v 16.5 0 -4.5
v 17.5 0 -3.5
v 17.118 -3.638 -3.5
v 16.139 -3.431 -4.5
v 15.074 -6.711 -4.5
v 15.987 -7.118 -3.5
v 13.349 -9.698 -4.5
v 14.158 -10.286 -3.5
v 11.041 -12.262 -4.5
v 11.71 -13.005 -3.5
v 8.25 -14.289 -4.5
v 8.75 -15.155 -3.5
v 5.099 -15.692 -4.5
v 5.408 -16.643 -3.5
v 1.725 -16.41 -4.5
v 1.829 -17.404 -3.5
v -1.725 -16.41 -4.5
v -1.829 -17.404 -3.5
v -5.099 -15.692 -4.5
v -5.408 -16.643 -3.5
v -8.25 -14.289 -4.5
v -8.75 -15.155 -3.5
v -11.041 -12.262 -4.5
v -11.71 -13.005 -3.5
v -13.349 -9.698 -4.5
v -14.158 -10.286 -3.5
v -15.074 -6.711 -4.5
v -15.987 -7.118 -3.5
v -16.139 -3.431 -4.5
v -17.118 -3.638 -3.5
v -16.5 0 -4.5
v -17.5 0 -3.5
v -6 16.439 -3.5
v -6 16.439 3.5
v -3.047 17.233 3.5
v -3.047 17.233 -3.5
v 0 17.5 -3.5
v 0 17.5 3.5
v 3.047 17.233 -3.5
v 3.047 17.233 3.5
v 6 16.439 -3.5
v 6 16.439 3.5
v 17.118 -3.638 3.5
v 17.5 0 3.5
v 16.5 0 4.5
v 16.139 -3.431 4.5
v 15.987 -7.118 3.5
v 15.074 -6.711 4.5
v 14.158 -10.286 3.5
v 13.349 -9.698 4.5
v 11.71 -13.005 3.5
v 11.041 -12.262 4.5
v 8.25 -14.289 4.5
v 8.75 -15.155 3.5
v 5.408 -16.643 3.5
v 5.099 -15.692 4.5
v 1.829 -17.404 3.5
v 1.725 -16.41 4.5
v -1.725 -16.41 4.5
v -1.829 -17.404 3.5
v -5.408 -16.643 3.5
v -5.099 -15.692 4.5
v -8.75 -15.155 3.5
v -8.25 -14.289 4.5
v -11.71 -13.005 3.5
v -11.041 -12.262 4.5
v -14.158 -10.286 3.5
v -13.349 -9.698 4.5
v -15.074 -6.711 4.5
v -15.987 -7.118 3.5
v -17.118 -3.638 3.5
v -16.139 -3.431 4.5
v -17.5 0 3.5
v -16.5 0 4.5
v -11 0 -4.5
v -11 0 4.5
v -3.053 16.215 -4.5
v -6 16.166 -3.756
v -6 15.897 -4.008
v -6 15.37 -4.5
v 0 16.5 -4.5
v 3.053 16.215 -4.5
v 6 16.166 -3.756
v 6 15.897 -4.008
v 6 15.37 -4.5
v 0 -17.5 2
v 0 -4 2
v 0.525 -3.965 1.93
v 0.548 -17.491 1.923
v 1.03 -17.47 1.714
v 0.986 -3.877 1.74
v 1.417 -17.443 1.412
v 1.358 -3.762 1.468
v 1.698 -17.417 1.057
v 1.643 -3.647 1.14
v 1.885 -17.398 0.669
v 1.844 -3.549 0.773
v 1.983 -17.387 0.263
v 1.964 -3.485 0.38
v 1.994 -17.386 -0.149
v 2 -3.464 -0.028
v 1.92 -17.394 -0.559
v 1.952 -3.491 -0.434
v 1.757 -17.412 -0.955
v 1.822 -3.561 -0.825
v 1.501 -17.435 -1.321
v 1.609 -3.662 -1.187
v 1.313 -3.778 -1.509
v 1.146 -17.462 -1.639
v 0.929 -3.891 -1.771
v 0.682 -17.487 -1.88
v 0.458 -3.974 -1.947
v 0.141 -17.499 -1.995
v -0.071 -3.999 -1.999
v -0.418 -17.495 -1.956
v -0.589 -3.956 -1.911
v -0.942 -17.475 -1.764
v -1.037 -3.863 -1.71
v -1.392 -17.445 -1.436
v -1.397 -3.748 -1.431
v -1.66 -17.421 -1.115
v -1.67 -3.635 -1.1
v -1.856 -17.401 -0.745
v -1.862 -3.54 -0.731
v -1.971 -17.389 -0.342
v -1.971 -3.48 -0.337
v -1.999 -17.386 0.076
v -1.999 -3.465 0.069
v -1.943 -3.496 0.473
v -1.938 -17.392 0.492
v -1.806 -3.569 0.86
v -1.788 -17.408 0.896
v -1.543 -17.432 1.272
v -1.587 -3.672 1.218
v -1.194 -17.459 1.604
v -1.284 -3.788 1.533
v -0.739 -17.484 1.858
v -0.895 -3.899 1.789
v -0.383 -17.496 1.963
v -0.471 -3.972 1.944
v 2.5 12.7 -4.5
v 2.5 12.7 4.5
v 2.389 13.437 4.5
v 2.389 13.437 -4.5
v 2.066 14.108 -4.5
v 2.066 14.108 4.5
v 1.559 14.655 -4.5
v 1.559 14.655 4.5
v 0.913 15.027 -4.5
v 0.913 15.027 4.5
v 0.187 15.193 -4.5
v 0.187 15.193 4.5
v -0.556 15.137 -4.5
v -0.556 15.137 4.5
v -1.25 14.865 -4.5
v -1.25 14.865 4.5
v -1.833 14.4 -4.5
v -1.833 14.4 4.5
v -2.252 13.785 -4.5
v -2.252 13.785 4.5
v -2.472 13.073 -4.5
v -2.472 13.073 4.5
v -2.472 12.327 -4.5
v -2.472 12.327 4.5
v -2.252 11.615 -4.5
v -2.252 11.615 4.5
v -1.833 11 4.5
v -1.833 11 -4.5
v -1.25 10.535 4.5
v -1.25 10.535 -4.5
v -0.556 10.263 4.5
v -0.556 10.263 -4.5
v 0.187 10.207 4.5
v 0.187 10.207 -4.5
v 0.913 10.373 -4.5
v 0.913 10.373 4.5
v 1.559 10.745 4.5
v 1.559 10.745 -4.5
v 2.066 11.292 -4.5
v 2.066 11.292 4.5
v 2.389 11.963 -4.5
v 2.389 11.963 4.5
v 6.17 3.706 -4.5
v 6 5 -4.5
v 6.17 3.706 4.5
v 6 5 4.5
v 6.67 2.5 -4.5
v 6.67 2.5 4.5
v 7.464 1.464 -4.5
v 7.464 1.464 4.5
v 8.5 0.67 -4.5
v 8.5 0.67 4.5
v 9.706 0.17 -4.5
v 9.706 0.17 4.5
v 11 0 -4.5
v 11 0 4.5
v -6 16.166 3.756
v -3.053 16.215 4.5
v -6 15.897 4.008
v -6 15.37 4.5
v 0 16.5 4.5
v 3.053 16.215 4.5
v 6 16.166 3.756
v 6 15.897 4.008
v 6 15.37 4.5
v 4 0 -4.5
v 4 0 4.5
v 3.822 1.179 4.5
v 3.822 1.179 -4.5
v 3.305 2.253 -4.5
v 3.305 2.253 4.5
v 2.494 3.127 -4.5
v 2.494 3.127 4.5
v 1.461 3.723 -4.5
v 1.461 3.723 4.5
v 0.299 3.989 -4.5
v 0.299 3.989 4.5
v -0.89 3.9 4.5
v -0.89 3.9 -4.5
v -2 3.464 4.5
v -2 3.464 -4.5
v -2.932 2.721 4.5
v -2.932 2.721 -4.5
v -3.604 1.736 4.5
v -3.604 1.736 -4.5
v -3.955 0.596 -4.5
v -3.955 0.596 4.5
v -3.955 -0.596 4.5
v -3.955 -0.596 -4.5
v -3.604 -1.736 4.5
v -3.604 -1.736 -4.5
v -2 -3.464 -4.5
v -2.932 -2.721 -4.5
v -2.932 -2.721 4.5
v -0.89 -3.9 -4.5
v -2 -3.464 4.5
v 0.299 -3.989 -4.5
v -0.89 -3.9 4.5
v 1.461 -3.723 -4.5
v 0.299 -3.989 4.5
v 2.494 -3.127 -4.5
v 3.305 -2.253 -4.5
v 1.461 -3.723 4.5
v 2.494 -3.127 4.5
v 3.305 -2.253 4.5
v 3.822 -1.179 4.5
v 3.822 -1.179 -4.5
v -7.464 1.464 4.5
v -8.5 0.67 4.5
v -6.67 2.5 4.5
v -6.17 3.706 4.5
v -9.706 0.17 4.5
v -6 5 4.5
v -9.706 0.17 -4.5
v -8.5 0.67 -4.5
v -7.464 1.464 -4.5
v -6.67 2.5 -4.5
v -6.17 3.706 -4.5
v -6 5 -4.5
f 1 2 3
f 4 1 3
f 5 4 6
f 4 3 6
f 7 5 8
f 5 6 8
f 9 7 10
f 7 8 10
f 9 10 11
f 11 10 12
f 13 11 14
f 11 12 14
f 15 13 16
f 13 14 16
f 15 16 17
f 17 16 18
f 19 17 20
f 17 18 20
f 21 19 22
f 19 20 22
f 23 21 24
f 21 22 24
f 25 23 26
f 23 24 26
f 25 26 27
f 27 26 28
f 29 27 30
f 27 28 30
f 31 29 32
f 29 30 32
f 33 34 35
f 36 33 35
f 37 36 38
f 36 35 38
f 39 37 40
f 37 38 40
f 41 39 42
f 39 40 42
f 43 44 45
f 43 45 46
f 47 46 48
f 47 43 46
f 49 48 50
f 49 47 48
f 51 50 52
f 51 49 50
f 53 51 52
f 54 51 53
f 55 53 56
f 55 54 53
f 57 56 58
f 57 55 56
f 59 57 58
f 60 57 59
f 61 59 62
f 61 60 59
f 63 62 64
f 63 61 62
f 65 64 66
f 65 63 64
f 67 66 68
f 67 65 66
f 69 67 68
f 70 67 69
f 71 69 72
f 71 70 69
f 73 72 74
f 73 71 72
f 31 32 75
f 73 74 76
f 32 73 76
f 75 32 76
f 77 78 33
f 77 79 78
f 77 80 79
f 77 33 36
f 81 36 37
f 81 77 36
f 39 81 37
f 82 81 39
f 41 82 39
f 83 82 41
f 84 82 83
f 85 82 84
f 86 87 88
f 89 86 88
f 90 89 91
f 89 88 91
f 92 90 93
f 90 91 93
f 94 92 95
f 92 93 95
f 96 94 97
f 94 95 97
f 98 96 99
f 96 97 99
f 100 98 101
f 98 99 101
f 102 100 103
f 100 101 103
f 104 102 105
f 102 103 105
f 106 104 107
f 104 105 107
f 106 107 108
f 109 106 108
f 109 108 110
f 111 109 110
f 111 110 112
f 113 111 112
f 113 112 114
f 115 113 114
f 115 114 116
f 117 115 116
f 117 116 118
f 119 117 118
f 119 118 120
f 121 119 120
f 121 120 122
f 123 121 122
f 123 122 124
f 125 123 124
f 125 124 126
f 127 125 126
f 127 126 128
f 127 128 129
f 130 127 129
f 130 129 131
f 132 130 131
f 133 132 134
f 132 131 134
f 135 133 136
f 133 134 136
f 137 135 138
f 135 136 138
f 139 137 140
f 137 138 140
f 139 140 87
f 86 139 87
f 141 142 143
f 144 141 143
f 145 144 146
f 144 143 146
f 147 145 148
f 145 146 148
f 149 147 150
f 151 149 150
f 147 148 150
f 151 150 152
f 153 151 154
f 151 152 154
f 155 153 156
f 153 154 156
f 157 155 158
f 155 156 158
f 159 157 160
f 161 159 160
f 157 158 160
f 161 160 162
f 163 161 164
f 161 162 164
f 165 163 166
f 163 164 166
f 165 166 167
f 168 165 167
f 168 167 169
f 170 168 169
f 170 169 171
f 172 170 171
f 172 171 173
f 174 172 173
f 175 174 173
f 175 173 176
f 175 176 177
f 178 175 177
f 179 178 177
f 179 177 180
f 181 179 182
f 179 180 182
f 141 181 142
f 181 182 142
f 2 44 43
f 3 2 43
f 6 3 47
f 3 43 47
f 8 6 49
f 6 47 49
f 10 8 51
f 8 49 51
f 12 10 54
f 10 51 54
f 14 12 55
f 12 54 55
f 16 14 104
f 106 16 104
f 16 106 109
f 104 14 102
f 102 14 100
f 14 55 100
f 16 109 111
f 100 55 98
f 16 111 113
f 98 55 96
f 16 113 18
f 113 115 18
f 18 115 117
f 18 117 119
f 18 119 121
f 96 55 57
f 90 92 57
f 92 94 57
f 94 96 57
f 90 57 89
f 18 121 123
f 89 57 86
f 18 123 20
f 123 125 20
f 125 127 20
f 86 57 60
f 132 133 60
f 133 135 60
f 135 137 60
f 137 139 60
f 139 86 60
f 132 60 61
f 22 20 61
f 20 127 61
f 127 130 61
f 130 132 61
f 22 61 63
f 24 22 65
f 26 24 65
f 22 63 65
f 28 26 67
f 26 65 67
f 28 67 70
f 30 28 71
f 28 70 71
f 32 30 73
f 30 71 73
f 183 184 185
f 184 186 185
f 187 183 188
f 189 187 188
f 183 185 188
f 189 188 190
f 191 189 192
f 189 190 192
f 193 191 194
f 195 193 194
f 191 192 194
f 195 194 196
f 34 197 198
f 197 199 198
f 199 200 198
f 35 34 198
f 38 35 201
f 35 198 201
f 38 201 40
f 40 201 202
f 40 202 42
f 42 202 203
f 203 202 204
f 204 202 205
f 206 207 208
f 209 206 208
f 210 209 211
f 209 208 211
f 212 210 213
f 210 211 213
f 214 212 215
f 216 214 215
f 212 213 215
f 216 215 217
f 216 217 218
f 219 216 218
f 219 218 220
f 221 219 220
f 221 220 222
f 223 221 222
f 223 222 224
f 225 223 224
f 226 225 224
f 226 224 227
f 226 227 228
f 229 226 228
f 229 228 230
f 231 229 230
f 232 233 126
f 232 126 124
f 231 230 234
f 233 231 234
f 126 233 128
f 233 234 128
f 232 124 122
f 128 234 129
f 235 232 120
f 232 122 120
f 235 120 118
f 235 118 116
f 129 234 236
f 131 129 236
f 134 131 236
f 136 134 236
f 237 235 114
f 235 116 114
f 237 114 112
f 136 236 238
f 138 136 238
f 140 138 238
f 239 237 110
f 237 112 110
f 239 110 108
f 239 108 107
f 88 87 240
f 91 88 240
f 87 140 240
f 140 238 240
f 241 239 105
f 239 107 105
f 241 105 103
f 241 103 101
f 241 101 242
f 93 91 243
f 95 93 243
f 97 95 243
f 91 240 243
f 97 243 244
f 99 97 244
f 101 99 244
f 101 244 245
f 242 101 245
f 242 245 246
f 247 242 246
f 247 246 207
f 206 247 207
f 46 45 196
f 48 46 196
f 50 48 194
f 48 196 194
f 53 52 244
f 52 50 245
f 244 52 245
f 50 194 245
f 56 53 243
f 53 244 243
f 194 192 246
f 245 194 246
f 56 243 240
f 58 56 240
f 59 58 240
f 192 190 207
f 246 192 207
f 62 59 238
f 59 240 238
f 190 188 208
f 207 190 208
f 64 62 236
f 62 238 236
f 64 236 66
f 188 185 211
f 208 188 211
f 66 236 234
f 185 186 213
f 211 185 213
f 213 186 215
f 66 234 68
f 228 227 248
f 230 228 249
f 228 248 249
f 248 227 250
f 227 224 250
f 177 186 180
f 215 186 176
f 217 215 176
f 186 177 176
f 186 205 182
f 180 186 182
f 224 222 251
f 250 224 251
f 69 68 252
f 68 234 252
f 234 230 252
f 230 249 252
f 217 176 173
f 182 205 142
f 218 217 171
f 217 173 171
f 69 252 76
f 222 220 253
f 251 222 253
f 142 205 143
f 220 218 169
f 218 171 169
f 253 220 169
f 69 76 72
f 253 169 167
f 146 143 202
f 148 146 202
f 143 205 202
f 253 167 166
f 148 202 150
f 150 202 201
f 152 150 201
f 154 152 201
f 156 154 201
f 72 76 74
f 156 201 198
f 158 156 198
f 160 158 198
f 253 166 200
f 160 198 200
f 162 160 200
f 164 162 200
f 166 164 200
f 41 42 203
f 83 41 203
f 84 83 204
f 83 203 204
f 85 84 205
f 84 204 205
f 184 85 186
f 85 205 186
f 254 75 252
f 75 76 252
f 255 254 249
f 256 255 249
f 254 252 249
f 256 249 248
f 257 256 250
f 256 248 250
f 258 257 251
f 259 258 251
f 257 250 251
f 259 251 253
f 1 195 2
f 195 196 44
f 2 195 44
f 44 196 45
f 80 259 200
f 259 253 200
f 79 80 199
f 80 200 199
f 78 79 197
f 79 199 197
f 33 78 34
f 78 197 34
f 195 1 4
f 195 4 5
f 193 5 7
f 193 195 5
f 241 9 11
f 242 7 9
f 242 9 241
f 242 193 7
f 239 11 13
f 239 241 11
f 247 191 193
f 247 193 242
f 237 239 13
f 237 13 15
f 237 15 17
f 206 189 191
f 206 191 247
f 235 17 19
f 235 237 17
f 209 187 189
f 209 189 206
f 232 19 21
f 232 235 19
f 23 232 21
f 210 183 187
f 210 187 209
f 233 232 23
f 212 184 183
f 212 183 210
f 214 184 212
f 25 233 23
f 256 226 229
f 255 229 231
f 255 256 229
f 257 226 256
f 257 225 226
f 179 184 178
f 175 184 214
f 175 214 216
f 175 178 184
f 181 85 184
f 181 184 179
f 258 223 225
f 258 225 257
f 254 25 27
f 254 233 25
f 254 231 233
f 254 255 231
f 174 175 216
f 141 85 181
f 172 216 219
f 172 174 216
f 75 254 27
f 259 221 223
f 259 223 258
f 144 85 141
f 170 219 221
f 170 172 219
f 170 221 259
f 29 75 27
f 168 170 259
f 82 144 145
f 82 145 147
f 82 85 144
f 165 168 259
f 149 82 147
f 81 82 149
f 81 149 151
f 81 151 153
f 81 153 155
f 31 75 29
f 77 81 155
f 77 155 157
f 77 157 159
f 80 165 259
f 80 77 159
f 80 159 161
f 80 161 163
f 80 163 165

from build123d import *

# Parameters (mm, degrees)
BOSS_EXTRUDE1_DEPTH = 4.5
SKETCH2_R           = 4
SKETCH2_R_2         = 2.5
CUT_EXTRUDE1_DEPTH  = 9
SKETCH3_R           = 2
CUT_EXTRUDE2_DEPTH  = 26.154522456
CHAMFER1_SIZE       = 1


with BuildPart() as part:
    # Sketch1 → Boss-Extrude1 (new, symmetric)
    with BuildSketch(Plane.XY):
        with BuildLine():
            Line((6, 16.439282223), (6, 5))
            ThreePointArc((6, 5), (7.464466094, 1.464466094), (11, 0))
            Line((11, 0), (17.5, 0))
            ThreePointArc((17.5, 0), (0, -17.5), (-17.5, 0))
            Line((-17.5, 0), (-11, 0))
            ThreePointArc((-11, 0), (-7.464466094, 1.464466094), (-6, 5))
            Line((-6, 5), (-6, 16.439282223))
            ThreePointArc((-6, 16.439282223), (0, 17.5), (6, 16.439282223))
        make_face()
    extrude(amount=BOSS_EXTRUDE1_DEPTH, both=True)

    # Sketch2 → Cut-Extrude1 (cut)
    with BuildSketch(Plane.XY.offset(4.5)):
        Circle(SKETCH2_R)
        with Locations((0, 12.7)):
            Circle(SKETCH2_R_2)
    extrude(amount=-CUT_EXTRUDE1_DEPTH, mode=Mode.SUBTRACT)

    # Sketch3 → Cut-Extrude2 (cut, through all)
    with BuildSketch(Plane(origin=(0, 0, 0), x_dir=(1, 0, 0), z_dir=(0, 1, 0))):
        with Locations(Location((0, 0, 0), (0, 0, 270))):
            Circle(SKETCH3_R)
    extrude(amount=-CUT_EXTRUDE2_DEPTH, mode=Mode.SUBTRACT)

    # Chamfer1
    chamfer1_edges = [part.edges().sort_by_distance(p)[0] for p in [
        (0, 17.5, -4.5),
        (0, -17.5, 4.5),
        (0, 17.5, 4.5),
        (0, -17.5, -4.5),
    ]]
    chamfer(chamfer1_edges, length=CHAMFER1_SIZE)


solid = part.part
